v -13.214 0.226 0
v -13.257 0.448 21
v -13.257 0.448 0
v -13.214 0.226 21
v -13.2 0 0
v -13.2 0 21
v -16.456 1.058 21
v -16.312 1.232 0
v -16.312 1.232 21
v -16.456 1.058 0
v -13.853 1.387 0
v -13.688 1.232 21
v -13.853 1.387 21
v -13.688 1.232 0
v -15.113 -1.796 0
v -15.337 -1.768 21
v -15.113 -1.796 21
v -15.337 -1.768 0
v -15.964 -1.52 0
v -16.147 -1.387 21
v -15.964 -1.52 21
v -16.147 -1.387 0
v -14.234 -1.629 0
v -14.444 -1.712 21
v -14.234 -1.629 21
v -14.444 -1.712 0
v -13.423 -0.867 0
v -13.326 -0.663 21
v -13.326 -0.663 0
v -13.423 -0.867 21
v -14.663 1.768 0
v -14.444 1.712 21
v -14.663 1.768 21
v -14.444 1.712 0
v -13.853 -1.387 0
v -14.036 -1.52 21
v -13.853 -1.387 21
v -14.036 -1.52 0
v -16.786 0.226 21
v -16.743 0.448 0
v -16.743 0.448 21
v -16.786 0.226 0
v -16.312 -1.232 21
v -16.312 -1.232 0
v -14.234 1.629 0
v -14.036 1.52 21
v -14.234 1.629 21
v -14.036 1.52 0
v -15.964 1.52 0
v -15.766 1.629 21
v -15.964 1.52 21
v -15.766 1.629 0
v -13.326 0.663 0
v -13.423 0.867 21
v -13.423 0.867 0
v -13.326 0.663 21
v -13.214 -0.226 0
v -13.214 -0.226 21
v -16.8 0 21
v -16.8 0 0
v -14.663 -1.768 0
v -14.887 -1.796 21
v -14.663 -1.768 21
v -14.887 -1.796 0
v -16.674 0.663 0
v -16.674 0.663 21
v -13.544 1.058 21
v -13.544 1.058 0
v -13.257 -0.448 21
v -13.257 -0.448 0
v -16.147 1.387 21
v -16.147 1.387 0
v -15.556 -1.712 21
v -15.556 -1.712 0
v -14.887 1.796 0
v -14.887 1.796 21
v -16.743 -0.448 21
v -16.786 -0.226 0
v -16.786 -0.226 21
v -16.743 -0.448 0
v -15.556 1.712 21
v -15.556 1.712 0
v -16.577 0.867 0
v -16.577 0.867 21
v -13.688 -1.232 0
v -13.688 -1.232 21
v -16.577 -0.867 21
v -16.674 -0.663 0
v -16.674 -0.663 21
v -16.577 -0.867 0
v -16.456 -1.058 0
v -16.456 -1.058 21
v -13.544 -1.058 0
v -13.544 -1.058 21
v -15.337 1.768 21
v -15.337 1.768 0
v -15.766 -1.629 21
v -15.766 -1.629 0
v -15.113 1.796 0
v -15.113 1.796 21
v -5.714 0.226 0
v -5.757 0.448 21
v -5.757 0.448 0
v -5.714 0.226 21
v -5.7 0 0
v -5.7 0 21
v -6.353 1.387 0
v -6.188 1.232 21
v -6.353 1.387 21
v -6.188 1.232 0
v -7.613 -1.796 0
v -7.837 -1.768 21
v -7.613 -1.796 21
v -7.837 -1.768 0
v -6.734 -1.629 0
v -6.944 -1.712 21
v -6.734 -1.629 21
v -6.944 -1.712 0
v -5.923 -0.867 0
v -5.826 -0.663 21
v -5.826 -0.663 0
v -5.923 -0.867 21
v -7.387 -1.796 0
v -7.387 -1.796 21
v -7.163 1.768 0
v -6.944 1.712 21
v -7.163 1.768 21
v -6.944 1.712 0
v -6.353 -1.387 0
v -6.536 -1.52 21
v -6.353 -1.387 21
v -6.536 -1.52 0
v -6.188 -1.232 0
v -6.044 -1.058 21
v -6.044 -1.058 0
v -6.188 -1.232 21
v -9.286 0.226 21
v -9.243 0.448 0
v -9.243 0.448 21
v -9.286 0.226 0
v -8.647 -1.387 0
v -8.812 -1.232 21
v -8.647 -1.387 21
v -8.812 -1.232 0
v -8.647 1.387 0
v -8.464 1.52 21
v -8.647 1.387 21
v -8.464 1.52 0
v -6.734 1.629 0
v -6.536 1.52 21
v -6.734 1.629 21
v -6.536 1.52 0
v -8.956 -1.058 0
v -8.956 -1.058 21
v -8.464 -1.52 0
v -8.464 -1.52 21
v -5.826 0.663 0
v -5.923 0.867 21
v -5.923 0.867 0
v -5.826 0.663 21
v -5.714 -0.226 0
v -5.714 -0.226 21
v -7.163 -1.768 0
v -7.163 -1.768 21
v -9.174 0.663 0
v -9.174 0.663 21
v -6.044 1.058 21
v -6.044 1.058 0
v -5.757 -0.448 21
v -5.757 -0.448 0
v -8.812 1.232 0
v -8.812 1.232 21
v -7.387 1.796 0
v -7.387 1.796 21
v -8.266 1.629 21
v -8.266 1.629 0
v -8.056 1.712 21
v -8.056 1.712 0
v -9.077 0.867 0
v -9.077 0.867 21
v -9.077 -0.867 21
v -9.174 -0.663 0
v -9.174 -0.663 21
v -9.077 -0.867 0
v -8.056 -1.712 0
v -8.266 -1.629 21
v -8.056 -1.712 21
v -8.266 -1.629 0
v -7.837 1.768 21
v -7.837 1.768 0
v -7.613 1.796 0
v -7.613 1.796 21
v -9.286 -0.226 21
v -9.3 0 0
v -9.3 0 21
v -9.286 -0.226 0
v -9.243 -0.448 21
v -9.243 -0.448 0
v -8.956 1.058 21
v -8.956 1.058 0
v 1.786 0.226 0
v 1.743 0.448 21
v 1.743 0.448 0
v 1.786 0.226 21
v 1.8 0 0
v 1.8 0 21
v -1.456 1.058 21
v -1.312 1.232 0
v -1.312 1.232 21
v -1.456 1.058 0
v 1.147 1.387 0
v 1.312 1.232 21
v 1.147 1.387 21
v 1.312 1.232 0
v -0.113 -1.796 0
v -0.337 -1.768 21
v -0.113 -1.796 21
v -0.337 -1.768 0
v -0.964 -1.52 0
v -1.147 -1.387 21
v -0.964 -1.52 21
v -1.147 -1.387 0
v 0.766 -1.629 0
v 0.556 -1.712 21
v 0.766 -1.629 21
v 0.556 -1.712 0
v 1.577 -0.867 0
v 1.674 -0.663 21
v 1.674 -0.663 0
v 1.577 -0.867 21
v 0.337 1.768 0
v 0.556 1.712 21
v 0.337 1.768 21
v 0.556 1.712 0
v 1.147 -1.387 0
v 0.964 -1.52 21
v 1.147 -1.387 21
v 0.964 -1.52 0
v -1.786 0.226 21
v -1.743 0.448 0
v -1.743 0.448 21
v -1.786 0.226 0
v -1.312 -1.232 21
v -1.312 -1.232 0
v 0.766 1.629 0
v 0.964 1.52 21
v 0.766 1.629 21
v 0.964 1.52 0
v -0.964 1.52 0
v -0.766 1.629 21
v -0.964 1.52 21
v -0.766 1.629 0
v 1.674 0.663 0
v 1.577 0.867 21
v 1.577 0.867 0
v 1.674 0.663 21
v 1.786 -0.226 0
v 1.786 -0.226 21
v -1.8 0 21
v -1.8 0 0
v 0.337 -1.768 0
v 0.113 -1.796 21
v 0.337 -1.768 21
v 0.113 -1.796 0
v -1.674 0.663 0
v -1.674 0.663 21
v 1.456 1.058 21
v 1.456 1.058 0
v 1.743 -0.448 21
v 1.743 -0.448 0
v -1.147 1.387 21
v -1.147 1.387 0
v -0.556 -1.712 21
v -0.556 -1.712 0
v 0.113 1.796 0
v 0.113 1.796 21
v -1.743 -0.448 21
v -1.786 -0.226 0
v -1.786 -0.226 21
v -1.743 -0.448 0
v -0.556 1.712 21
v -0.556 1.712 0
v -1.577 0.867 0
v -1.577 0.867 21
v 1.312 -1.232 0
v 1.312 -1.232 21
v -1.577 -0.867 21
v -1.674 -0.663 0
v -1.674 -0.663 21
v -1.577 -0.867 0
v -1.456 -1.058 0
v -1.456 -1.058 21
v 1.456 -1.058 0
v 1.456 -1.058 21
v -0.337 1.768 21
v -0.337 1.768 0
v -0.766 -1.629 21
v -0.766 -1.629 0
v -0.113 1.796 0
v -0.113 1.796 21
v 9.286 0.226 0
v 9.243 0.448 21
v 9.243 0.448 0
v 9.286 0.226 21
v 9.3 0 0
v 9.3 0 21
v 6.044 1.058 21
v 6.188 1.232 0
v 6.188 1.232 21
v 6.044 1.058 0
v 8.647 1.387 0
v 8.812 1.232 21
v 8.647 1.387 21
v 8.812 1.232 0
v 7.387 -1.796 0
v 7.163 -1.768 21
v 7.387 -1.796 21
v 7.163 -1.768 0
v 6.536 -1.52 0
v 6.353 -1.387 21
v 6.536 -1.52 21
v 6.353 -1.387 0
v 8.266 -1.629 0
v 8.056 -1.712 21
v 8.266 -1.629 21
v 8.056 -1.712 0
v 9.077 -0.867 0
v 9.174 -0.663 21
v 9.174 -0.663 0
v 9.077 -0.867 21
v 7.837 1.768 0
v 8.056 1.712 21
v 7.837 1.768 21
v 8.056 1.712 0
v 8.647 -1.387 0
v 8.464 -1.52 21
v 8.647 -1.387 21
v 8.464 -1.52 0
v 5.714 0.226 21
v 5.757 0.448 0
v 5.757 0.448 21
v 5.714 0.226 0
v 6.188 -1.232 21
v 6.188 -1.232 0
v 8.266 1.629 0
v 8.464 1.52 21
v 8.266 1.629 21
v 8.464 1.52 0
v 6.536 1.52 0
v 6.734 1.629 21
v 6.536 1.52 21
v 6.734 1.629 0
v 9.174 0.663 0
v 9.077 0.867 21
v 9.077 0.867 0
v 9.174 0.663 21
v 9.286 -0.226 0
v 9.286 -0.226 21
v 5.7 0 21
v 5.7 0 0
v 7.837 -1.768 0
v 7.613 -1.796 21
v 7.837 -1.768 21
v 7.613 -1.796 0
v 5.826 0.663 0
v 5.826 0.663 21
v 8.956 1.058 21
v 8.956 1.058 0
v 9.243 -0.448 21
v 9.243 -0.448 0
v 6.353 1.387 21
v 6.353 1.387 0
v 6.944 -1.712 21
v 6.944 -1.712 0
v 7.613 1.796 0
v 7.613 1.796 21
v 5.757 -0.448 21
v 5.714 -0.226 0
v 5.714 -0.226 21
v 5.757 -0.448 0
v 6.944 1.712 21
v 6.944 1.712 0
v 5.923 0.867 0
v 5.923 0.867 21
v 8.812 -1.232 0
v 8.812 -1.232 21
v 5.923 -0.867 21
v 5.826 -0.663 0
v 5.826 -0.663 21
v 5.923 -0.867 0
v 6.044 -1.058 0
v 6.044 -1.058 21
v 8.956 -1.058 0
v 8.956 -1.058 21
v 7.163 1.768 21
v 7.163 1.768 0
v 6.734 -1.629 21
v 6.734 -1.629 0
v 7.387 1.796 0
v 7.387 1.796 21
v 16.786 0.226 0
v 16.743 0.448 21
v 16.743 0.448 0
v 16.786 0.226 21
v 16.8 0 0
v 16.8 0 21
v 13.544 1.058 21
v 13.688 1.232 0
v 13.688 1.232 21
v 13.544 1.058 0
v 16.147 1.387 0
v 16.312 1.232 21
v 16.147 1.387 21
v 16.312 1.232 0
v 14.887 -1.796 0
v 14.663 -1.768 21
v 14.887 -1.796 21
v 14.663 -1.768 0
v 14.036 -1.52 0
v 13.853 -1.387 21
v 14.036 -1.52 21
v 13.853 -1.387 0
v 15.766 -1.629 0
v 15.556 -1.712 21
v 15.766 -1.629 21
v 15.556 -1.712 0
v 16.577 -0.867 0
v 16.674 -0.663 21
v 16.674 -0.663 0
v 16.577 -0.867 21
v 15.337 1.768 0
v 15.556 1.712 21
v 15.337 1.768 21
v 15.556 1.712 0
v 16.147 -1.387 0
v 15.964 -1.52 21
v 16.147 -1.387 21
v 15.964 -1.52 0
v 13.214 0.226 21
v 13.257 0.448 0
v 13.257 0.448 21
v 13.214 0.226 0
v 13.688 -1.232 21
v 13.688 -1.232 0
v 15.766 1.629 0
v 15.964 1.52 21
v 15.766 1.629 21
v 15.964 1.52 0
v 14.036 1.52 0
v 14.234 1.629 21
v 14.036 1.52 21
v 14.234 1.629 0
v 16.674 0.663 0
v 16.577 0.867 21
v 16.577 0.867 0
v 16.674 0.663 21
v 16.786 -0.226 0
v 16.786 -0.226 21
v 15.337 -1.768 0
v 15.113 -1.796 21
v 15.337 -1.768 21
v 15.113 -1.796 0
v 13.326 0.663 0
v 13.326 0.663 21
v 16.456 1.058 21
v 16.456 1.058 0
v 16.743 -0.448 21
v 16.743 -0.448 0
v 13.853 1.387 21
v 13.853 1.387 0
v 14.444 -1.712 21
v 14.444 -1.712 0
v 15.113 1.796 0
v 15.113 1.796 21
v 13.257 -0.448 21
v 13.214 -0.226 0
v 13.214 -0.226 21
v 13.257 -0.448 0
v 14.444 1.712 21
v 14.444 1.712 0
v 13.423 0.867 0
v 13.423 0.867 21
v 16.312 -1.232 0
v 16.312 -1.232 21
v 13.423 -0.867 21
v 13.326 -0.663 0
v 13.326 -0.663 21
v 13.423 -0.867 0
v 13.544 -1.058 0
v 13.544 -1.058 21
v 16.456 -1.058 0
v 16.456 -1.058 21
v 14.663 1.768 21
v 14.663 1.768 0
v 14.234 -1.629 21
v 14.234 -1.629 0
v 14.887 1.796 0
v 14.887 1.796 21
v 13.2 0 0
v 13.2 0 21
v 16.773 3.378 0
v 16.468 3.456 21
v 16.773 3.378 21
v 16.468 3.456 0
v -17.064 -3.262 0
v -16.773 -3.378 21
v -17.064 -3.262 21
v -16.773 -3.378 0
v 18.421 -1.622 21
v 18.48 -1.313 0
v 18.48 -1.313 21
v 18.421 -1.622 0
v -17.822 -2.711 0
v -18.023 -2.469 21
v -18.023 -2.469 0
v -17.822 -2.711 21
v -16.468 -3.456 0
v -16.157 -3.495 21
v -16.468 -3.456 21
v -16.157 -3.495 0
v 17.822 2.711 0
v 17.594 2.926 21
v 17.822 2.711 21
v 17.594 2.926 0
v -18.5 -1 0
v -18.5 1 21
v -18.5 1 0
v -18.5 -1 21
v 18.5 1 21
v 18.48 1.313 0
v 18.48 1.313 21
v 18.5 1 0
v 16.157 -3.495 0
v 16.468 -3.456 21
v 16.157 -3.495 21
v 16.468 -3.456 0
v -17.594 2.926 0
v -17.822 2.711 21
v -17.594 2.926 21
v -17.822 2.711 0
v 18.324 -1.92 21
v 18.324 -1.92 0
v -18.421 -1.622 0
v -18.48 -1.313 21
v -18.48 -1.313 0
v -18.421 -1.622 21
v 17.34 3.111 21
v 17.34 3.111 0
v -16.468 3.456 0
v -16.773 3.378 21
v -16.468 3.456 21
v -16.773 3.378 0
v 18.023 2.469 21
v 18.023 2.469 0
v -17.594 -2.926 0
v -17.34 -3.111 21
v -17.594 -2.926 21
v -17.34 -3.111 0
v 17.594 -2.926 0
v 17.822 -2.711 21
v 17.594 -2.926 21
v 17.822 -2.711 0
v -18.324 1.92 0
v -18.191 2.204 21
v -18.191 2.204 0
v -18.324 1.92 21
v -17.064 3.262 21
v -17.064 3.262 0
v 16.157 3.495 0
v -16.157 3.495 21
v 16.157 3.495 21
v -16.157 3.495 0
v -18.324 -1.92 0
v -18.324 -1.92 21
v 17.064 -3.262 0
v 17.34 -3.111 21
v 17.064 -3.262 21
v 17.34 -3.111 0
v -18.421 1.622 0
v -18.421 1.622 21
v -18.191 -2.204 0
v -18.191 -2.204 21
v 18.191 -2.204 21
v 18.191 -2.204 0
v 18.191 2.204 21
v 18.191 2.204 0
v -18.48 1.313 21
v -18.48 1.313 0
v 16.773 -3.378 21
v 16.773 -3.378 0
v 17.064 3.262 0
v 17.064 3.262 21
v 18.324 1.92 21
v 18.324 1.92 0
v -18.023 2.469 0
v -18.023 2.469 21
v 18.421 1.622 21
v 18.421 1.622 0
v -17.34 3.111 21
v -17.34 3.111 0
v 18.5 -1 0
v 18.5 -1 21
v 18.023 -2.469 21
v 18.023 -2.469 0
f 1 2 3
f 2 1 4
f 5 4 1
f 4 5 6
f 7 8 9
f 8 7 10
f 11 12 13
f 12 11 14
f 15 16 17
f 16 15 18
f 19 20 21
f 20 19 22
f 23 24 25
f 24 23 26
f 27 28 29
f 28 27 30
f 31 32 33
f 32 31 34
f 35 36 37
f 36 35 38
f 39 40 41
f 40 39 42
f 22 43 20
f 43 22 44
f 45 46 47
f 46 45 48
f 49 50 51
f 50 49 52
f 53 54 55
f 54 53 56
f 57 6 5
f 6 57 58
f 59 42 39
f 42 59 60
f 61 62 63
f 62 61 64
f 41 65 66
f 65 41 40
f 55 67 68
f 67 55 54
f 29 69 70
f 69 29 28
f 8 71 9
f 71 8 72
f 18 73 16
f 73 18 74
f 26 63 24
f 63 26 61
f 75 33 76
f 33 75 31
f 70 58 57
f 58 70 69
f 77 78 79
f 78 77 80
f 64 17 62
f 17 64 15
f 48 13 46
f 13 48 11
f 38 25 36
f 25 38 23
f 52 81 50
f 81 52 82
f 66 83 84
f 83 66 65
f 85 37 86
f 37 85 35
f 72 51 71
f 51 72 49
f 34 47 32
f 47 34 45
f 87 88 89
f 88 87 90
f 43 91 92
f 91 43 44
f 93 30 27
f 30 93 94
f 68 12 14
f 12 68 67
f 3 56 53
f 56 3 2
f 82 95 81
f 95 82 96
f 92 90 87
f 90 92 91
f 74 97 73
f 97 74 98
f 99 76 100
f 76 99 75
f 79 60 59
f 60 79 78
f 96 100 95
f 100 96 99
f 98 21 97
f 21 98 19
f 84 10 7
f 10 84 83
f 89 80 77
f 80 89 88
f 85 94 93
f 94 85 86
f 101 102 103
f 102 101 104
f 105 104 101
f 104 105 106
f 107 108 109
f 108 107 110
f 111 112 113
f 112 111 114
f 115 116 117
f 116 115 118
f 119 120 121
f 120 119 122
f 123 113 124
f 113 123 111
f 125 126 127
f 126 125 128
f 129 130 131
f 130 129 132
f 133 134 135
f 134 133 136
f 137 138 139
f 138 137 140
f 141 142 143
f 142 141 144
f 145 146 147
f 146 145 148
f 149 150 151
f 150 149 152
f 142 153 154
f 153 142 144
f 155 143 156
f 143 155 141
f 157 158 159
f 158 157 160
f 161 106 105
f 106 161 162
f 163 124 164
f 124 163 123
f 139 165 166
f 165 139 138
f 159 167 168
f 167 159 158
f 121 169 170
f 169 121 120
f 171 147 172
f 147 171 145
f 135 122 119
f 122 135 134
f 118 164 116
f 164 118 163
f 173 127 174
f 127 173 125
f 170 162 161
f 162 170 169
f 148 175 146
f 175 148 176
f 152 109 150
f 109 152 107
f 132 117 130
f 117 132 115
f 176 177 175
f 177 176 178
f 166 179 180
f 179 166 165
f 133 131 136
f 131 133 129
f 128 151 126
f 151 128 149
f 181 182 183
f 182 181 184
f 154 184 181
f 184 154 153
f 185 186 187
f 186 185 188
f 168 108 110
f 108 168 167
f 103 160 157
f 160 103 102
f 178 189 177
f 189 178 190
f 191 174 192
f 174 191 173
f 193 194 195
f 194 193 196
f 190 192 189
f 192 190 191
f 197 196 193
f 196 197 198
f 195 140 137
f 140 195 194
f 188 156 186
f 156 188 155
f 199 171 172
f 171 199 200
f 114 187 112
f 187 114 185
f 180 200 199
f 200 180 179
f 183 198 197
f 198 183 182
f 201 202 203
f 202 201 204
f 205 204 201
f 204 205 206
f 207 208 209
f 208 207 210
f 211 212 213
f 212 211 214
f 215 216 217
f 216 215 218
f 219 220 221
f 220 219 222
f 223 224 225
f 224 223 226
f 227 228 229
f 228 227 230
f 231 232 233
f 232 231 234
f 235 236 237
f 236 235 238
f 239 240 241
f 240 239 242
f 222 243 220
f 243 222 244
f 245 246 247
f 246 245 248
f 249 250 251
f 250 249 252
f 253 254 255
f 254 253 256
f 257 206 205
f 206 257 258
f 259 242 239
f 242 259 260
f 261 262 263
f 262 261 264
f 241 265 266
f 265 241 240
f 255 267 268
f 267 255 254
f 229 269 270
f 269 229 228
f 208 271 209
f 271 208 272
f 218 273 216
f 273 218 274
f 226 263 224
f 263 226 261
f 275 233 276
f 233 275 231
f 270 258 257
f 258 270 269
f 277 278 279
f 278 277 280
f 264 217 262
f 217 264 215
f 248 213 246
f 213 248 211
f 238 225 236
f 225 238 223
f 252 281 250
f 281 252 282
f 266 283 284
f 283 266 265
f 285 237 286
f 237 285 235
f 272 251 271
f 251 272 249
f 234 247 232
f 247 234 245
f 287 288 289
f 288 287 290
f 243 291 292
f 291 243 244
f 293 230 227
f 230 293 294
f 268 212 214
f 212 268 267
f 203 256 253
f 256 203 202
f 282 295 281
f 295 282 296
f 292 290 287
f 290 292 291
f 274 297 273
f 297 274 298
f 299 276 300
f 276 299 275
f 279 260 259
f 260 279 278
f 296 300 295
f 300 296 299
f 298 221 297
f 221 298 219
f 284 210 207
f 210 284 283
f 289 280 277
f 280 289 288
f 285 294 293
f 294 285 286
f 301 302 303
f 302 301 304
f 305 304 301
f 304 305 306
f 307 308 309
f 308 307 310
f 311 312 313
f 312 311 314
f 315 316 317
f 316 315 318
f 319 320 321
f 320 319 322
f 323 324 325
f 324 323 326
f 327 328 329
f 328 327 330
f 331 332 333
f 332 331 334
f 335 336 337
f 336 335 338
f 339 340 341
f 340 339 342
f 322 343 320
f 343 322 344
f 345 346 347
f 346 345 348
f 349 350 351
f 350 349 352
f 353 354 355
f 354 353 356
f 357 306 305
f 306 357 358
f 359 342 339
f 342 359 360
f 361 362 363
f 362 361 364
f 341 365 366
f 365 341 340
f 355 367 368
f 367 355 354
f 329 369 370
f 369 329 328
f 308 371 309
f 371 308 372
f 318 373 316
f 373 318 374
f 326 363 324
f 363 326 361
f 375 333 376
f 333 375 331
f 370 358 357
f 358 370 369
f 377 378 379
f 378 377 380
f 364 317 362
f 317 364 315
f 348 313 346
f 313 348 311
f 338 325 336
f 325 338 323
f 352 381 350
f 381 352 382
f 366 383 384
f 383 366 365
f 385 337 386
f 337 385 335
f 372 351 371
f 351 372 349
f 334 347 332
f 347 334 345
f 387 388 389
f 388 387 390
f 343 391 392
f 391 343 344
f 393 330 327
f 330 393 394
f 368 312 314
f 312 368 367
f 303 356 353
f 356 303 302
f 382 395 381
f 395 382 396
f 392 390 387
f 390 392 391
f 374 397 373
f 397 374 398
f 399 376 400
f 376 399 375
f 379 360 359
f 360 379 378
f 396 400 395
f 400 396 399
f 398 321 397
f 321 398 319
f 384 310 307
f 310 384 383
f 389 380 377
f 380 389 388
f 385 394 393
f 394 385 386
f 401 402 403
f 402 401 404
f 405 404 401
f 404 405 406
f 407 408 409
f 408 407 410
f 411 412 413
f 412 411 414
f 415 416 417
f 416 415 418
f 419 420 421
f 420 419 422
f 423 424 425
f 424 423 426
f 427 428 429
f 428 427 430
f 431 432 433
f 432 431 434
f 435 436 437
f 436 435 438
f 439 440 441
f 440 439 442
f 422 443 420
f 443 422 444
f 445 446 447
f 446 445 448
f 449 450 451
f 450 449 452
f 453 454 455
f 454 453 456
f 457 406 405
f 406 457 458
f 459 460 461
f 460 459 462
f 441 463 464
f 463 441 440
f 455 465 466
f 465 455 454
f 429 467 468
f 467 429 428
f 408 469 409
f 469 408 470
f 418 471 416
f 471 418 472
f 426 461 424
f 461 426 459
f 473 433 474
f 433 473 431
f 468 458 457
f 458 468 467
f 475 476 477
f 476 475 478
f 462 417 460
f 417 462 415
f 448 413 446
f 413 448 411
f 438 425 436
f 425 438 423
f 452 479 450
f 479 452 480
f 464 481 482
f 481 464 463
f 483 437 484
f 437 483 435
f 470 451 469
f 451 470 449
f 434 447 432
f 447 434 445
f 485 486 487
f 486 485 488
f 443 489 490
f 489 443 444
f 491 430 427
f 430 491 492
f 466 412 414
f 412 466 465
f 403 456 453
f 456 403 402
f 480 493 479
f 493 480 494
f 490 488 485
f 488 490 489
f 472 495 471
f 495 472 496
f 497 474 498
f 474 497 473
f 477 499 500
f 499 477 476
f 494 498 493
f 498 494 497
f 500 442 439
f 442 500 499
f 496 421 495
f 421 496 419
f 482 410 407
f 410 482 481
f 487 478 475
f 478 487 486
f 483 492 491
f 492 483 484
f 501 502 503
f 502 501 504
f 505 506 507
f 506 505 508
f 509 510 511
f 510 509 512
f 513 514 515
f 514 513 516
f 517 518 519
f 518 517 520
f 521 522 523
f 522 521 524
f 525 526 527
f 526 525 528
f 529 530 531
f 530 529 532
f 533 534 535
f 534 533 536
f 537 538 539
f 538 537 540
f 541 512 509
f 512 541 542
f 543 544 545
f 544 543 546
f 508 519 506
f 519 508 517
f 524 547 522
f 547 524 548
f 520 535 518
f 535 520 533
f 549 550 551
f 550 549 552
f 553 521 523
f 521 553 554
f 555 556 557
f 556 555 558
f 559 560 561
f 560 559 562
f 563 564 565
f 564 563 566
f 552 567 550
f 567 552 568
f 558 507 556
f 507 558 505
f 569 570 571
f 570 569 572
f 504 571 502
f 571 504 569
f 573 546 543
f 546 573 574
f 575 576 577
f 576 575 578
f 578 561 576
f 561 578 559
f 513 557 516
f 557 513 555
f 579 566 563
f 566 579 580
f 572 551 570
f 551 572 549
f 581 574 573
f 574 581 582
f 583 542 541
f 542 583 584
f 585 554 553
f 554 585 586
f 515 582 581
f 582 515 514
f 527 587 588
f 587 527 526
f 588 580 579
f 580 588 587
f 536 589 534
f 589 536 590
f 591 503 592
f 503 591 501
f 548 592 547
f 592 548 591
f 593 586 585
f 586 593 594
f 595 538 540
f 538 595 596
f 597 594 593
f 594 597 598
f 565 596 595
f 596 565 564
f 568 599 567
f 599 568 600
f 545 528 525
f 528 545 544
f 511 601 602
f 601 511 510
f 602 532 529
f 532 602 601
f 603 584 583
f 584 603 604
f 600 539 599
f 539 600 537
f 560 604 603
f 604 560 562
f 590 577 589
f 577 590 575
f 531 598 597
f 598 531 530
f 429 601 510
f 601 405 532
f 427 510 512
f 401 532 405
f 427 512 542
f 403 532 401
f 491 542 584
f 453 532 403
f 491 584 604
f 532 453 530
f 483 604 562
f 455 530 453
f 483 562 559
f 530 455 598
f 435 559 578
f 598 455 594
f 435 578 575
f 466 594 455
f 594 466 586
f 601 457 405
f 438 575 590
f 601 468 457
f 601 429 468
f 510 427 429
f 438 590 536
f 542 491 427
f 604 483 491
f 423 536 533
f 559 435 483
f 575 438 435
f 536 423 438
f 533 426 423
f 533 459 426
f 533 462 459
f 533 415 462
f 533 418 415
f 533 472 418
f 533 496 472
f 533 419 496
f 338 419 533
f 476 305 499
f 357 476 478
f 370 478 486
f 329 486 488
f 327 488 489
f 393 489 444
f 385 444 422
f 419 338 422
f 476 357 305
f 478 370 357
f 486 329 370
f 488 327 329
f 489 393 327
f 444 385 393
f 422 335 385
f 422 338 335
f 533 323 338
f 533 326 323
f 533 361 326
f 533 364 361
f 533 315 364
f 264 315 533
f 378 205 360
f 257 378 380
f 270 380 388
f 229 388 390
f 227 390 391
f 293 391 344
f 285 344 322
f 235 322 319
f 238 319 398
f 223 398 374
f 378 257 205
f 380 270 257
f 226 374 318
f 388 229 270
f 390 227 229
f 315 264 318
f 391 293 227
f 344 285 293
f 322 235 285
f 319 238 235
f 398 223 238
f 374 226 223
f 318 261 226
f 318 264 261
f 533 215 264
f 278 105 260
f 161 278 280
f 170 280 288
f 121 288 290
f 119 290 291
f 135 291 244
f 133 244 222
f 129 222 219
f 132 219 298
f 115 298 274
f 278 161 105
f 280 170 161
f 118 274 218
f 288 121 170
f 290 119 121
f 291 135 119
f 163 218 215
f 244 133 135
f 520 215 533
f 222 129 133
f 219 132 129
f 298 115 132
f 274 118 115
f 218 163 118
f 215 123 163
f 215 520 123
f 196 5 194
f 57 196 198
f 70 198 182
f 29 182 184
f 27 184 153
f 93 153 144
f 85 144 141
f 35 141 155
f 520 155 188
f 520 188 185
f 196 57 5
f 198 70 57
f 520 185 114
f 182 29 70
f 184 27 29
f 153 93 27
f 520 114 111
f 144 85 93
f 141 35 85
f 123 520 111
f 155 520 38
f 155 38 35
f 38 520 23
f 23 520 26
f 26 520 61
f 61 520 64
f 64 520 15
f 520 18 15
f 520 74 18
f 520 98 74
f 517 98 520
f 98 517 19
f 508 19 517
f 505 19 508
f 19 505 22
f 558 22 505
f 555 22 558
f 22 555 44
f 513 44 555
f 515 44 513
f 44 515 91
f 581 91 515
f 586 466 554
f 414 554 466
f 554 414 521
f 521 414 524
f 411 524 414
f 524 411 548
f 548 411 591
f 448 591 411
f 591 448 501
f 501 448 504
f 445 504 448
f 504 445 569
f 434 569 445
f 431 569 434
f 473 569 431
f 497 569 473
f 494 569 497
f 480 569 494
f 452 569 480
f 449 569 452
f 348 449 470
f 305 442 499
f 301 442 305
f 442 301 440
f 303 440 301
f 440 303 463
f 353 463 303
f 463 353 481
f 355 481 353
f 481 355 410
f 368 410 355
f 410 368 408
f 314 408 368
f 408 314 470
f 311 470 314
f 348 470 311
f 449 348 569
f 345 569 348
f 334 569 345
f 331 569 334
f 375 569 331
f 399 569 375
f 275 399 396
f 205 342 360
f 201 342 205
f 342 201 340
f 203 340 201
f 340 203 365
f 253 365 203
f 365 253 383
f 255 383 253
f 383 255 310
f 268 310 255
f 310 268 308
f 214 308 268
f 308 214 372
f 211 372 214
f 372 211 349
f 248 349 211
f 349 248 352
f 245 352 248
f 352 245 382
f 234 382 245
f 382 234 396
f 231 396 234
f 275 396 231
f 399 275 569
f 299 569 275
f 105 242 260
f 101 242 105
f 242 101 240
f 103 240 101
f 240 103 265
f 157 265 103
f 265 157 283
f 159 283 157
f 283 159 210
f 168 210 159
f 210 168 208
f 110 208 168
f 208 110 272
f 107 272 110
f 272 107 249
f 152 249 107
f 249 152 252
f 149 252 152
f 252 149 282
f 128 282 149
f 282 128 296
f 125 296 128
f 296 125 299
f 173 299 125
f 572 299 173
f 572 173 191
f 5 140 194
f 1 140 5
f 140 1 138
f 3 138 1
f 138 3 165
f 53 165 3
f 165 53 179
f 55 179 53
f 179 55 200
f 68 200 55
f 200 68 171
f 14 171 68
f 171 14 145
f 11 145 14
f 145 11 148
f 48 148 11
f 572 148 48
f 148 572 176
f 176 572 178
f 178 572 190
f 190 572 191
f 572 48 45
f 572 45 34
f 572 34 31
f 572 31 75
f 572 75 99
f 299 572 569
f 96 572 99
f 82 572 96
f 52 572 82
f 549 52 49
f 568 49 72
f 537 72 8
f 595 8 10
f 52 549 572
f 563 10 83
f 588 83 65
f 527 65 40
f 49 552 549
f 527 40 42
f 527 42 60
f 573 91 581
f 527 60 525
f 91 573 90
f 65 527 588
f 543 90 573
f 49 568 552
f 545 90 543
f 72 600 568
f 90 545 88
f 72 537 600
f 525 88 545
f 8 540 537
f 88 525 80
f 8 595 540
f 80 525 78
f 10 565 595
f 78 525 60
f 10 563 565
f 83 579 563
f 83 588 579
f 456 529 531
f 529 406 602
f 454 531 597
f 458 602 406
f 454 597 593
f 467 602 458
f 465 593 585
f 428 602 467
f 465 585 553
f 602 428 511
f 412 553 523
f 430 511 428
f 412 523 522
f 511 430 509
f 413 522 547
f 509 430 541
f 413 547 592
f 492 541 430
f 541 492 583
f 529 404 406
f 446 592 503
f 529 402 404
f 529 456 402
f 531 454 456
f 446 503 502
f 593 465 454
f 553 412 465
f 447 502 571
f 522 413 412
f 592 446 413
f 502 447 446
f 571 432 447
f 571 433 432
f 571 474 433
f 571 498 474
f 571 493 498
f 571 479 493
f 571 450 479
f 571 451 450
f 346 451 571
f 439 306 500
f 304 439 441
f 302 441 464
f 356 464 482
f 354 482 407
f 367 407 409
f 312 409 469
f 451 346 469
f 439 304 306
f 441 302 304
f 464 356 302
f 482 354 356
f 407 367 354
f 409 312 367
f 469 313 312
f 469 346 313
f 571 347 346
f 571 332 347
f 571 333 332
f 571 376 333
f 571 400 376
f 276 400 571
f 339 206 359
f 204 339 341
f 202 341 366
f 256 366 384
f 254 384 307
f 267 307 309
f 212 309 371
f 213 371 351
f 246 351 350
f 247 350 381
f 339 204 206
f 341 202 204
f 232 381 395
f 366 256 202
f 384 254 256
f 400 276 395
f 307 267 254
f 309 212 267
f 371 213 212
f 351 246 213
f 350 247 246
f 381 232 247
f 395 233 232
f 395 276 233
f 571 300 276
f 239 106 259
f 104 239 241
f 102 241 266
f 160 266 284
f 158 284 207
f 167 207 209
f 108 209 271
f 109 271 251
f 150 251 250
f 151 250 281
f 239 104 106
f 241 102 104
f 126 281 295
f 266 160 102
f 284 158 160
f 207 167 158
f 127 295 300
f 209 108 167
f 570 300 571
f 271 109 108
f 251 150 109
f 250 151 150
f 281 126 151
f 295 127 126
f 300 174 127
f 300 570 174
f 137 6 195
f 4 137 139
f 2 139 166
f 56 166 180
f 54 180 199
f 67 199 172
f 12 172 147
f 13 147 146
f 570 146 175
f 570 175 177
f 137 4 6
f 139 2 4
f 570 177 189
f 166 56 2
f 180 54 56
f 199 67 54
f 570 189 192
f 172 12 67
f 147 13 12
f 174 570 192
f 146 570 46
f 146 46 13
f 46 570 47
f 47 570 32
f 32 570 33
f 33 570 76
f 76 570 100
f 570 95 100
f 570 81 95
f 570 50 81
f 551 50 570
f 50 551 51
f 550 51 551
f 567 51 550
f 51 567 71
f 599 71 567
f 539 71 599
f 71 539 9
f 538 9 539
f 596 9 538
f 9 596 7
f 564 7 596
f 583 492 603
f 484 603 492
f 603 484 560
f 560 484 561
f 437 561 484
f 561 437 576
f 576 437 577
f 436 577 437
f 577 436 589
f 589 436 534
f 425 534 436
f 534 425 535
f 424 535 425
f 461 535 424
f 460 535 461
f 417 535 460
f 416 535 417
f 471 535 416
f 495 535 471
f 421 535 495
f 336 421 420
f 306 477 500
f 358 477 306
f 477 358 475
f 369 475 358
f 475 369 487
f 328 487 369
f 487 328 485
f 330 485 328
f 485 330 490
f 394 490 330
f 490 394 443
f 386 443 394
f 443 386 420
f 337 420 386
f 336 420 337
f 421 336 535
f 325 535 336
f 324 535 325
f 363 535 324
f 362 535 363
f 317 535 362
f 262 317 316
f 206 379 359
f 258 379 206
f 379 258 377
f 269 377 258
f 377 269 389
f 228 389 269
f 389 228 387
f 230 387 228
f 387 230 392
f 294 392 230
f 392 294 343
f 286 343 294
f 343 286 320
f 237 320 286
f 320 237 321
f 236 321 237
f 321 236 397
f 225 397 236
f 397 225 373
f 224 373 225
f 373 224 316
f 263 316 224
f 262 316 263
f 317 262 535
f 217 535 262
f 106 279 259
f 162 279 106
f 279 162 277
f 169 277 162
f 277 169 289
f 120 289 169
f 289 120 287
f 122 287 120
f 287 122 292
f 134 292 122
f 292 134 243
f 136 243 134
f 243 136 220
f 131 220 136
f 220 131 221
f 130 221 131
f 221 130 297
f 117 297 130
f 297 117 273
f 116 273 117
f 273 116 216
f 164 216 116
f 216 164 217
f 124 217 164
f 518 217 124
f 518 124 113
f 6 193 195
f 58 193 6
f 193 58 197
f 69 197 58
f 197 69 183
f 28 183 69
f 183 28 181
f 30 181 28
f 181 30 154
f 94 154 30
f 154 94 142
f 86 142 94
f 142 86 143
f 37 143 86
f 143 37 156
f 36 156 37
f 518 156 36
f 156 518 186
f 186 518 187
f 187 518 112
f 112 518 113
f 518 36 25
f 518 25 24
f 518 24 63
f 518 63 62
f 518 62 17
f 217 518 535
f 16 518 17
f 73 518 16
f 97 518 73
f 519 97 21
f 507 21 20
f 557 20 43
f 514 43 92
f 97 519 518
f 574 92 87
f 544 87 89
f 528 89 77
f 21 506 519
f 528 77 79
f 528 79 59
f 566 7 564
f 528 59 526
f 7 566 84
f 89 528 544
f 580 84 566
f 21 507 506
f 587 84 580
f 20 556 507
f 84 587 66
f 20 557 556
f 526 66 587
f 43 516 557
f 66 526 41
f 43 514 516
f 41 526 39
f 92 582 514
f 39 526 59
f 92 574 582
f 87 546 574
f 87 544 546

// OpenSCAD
$fn = 50;


difference() {
	union() {
		translate(v = [0, 0, 0]) {
			rotate(a = [0, 0, 0]) {
				hull() {
					translate(v = [-16.0000000000, 1.0000000000, 0]) {
						rotate(a = [0, 0, 0]) {
							translate(v = [0, 0, 0]) {
								rotate(a = [0, 0, 0]) {
									cylinder(h = 21, r = 2.5000000000);
								}
							}
						}
					}
					translate(v = [16.0000000000, 1.0000000000, 0]) {
						rotate(a = [0, 0, 0]) {
							translate(v = [0, 0, 0]) {
								rotate(a = [0, 0, 0]) {
									cylinder(h = 21, r = 2.5000000000);
								}
							}
						}
					}
					translate(v = [-16.0000000000, -1.0000000000, 0]) {
						rotate(a = [0, 0, 0]) {
							translate(v = [0, 0, 0]) {
								rotate(a = [0, 0, 0]) {
									cylinder(h = 21, r = 2.5000000000);
								}
							}
						}
					}
					translate(v = [16.0000000000, -1.0000000000, 0]) {
						rotate(a = [0, 0, 0]) {
							translate(v = [0, 0, 0]) {
								rotate(a = [0, 0, 0]) {
									cylinder(h = 21, r = 2.5000000000);
								}
							}
						}
					}
				}
			}
		}
	}
	union() {
		translate(v = [-15.0000000000, 0.0000000000, 0]) {
			rotate(a = [0, 0, 0]) {
				translate(v = [0, 0, -50]) {
					rotate(a = [0, 0, 0]) {
						cylinder(h = 100, r = 1.8000000000);
					}
				}
			}
		}
		translate(v = [-7.5000000000, 0.0000000000, 0]) {
			rotate(a = [0, 0, 0]) {
				translate(v = [0, 0, -50]) {
					rotate(a = [0, 0, 0]) {
						cylinder(h = 100, r = 1.8000000000);
					}
				}
			}
		}
		translate(v = [0.0000000000, 0.0000000000, 0]) {
			rotate(a = [0, 0, 0]) {
				translate(v = [0, 0, -50]) {
					rotate(a = [0, 0, 0]) {
						cylinder(h = 100, r = 1.8000000000);
					}
				}
			}
		}
		translate(v = [7.5000000000, 0.0000000000, 0]) {
			rotate(a = [0, 0, 0]) {
				translate(v = [0, 0, -50]) {
					rotate(a = [0, 0, 0]) {
						cylinder(h = 100, r = 1.8000000000);
					}
				}
			}
		}
		translate(v = [15.0000000000, 0.0000000000, 0]) {
			rotate(a = [0, 0, 0]) {
				translate(v = [0, 0, -50]) {
					rotate(a = [0, 0, 0]) {
						cylinder(h = 100, r = 1.8000000000);
					}
				}
			}
		}
	}
}
